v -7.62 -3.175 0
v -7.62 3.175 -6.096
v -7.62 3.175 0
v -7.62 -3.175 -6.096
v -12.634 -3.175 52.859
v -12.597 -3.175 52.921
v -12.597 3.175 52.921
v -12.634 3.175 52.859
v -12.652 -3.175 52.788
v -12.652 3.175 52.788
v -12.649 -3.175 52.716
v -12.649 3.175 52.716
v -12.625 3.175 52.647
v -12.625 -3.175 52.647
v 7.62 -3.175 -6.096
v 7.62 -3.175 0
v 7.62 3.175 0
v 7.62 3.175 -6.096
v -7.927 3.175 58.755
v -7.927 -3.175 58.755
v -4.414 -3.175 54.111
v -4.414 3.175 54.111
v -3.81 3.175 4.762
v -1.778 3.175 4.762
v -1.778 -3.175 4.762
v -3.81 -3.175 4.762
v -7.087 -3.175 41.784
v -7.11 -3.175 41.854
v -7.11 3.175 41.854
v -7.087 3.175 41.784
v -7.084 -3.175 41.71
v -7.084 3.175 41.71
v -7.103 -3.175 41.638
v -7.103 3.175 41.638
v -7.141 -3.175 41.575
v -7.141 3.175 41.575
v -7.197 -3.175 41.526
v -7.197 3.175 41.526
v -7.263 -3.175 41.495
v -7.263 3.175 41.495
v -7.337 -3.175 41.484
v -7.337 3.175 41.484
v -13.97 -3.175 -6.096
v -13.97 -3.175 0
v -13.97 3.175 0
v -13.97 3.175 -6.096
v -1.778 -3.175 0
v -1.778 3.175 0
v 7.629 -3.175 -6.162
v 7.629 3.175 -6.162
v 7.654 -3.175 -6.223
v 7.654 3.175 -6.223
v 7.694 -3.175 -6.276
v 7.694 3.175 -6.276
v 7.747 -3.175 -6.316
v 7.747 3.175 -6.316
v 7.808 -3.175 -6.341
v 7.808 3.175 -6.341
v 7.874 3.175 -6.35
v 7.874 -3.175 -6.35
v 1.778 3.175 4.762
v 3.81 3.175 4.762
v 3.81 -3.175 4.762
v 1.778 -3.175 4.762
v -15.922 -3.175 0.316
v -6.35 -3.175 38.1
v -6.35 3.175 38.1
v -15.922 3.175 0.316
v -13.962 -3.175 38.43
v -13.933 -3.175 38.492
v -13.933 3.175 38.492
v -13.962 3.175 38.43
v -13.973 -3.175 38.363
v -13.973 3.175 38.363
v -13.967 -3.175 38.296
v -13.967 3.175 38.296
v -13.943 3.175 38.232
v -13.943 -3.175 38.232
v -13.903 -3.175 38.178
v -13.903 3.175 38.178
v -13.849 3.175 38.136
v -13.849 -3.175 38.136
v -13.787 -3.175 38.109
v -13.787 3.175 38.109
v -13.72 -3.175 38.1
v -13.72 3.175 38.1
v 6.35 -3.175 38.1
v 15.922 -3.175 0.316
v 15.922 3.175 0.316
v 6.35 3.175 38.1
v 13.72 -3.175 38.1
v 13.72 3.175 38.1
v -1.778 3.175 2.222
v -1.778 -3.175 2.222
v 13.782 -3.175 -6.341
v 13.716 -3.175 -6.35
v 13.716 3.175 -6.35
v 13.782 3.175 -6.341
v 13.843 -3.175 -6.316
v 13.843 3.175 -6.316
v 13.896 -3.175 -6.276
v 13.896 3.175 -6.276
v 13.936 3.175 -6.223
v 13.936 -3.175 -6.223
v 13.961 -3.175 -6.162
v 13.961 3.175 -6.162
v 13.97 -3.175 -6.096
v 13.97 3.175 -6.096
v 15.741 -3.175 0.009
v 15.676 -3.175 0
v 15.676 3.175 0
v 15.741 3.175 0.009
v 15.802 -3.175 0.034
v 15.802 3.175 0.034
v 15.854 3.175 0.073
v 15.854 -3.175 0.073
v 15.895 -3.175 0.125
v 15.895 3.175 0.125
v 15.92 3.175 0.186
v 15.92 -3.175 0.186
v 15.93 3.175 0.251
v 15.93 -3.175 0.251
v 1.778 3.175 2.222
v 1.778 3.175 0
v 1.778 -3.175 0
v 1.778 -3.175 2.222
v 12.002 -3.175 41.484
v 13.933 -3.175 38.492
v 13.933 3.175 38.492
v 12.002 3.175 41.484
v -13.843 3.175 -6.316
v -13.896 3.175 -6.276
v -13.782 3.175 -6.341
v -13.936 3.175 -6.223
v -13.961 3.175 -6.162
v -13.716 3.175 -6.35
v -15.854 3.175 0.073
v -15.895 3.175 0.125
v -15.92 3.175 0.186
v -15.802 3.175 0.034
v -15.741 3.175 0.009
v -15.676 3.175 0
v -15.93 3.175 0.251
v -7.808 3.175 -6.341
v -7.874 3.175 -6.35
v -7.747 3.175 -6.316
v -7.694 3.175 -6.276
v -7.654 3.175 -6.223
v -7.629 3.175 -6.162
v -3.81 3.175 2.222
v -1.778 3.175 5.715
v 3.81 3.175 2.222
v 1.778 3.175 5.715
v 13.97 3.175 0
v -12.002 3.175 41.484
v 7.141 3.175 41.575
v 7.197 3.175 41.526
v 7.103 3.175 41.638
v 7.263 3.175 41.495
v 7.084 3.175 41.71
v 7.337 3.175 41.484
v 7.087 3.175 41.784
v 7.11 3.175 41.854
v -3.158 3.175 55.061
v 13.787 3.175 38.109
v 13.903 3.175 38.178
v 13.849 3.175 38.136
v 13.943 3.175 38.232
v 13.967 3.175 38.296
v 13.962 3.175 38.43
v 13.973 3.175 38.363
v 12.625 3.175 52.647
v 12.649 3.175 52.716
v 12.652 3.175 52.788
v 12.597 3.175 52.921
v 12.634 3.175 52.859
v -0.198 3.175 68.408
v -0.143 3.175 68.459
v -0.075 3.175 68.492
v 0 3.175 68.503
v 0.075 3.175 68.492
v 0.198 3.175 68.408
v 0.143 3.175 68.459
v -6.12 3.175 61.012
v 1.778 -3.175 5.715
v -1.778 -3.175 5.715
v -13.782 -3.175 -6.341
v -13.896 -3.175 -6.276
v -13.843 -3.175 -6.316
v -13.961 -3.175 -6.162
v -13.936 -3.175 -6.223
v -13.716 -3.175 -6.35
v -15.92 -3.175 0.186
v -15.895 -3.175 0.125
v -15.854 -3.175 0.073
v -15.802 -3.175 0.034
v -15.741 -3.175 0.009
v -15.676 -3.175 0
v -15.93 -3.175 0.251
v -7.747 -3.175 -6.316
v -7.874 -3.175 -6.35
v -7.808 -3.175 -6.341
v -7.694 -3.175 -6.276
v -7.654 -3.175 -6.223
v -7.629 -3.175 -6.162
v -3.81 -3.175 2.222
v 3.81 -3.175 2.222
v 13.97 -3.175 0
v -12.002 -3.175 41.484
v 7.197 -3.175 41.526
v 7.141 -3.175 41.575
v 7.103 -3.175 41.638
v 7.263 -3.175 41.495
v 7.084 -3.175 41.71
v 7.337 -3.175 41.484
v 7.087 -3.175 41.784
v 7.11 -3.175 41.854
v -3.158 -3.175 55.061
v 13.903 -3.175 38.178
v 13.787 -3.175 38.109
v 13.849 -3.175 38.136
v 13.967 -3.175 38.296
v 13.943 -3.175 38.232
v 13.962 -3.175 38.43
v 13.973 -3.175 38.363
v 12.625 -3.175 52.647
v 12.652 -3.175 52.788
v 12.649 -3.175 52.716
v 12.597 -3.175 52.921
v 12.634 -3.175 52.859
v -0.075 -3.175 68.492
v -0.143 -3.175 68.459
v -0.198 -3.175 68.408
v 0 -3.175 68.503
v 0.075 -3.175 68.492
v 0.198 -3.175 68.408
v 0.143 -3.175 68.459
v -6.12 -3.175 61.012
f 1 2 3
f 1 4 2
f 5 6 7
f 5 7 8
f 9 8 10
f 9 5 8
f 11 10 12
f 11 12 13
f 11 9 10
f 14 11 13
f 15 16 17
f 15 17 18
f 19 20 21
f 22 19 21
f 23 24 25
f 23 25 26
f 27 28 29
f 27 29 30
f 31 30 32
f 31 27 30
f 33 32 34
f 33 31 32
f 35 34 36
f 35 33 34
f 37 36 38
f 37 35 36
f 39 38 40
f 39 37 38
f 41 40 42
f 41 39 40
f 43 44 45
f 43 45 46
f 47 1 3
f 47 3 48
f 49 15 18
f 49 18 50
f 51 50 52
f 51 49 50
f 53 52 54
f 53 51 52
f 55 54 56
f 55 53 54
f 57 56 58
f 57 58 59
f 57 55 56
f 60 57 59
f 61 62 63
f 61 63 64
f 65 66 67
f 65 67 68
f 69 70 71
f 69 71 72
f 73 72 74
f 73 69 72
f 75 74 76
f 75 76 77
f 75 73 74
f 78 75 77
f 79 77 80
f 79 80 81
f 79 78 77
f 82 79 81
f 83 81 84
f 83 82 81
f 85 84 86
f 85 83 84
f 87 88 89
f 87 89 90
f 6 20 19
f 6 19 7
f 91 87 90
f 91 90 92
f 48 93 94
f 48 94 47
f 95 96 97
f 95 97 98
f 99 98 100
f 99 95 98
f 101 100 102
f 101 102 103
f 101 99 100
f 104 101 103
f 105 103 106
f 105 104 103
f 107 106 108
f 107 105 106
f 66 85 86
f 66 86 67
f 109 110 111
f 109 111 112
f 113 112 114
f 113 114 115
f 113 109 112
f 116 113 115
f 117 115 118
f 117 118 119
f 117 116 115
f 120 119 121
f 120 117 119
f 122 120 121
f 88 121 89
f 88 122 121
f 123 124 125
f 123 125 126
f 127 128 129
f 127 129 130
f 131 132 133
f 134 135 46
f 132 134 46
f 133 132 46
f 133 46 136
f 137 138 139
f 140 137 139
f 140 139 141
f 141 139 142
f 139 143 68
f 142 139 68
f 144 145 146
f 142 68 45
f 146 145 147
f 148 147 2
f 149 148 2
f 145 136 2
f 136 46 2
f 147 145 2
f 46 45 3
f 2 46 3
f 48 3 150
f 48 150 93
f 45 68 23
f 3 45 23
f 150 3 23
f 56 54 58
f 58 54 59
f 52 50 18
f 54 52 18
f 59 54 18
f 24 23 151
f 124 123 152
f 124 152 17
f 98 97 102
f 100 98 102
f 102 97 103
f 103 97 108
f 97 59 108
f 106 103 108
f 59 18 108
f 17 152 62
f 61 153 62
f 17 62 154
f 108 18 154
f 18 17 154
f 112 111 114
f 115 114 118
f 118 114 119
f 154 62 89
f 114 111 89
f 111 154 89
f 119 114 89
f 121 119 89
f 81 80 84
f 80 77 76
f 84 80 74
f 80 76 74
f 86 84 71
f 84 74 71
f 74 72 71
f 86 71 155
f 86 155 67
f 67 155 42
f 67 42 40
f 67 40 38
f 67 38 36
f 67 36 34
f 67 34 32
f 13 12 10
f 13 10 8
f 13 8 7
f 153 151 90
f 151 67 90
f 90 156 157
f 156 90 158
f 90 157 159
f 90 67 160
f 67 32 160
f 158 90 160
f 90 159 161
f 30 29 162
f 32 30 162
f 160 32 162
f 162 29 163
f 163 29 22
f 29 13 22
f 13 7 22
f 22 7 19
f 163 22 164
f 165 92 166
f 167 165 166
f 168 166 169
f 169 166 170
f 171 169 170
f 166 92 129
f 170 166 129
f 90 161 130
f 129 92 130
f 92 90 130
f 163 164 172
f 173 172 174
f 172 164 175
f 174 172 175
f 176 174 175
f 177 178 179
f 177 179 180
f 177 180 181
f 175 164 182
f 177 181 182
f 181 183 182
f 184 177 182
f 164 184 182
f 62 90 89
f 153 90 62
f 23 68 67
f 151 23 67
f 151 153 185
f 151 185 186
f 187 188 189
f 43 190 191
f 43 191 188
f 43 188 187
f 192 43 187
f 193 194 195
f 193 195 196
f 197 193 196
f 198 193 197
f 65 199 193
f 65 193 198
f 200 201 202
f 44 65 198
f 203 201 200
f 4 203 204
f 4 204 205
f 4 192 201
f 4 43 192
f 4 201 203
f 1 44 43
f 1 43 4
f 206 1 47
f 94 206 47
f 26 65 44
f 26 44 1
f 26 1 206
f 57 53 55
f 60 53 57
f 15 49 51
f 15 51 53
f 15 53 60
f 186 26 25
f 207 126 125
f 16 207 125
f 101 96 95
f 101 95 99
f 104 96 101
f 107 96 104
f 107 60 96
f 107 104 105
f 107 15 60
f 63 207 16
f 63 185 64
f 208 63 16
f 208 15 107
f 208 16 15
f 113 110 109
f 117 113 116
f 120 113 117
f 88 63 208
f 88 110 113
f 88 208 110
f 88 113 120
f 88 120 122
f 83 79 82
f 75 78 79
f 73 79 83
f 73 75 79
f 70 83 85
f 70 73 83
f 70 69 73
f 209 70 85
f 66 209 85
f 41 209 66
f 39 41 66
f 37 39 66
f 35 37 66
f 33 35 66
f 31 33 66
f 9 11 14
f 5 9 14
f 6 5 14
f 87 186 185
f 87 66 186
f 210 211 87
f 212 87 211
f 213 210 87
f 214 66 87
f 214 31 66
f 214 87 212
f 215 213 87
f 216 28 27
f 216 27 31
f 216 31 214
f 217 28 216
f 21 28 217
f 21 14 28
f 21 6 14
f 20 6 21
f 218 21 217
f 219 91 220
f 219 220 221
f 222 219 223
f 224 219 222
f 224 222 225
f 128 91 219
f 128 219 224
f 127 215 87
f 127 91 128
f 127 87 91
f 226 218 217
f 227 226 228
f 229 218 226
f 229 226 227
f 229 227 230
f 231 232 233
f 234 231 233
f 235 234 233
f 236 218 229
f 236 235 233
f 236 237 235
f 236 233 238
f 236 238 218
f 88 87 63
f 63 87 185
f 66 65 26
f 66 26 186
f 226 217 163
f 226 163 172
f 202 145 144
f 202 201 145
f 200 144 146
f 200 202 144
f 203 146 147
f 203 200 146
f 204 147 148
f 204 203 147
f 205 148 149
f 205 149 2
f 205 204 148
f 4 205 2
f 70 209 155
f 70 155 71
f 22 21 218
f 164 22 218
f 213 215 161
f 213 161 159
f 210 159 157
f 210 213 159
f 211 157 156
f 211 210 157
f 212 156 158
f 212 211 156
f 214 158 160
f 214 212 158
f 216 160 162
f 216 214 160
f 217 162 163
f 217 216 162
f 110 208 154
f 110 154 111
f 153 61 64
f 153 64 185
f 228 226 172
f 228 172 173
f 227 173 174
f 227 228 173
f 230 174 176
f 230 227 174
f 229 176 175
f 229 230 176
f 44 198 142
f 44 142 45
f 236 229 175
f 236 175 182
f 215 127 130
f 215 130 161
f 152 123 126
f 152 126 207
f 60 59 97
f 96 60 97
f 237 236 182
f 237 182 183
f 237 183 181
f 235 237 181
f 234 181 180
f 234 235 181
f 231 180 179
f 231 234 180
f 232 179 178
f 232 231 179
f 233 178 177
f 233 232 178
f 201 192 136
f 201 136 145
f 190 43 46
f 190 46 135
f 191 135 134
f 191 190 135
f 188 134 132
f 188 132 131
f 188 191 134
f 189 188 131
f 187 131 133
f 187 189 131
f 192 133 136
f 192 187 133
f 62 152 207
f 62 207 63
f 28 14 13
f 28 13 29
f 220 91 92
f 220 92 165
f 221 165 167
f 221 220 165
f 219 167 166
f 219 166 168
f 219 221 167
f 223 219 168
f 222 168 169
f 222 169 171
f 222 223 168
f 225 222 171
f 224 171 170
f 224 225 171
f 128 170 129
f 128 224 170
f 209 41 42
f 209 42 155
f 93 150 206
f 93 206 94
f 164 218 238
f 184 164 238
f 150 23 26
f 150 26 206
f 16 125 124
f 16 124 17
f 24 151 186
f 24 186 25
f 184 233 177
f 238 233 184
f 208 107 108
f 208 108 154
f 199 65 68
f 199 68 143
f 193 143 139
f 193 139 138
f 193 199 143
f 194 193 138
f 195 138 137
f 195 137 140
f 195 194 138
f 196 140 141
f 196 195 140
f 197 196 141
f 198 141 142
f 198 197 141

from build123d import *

# Parameters (mm, degrees)
F1_DEPTH      = 3.175
F1_DEPTH_BACK = 3.175
F3_DEPTH      = 25.4
F3_DEPTH_BACK = 25.4
F5_DEPTH      = 25.4
F5_DEPTH_BACK = 25.4


with BuildPart() as f1:
    # F0 (on Front) → F1 (new body, two sides)
    with BuildSketch(Plane.XZ) as f1_sk:
        with BuildLine():
            Line((-7.62, 0), (0, 0))
            Line((0, 0), (0, 38.1))
            Line((0, 38.1), (-6.35, 38.1))
            Line((-6.35, 38.1), (-15.9218513609, 0.3163762068))
            ThreePointArc((-15.9218513609, 0.3163762068), (-15.8760784336, 0.0979992893), (-15.6756294918, 0))
            Line((-15.6756294918, 0), (-13.97, 0))
            Line((-13.97, 0), (-13.97, -6.096))
            ThreePointArc((-13.97, -6.096), (-13.8956051224, -6.2756051224), (-13.716, -6.35))
            Line((-13.716, -6.35), (-7.874, -6.35))
            ThreePointArc((-7.874, -6.35), (-7.6943948776, -6.2756051224), (-7.62, -6.096))
            Line((-7.62, -6.096), (-7.62, 0))
        make_face()
        with BuildLine():
            Line((0, 38.1), (0, 0))
            Line((0, 0), (7.62, 0))
            Line((7.62, 0), (7.62, -6.096))
            ThreePointArc((7.62, -6.096), (7.6943948776, -6.2756051224), (7.874, -6.35))
            Line((7.874, -6.35), (13.716, -6.35))
            ThreePointArc((13.716, -6.35), (13.8956051224, -6.2756051224), (13.97, -6.096))
            Line((13.97, -6.096), (13.97, 0))
            Line((13.97, 0), (15.6756294918, 0))
            ThreePointArc((15.6756294918, 0), (15.8760784336, 0.0979992893), (15.9218513609, 0.3163762068))
            Line((15.9218513609, 0.3163762068), (6.35, 38.1))
            Line((6.35, 38.1), (0, 38.1))
        make_face()
        with BuildLine():
            Line((-6.35, 38.1), (0, 38.1))
            Line((0, 38.1), (6.35, 38.1))
            Line((6.35, 38.1), (12.0015, 38.1))
            Line((12.0015, 38.1), (12.0015, 41.4839549129))
            Line((12.0015, 41.4839549129), (7.3365180277, 41.4839549129))
            ThreePointArc((7.3365180277, 41.4839549129), (7.1198722569, 41.6053630202), (7.1103332026, 41.8535249129))
            Line((7.1103332026, 41.8535249129), (12.6253100407, 52.6470186525))
            ThreePointArc((12.6253100407, 52.6470186525), (12.6518210481, 52.7882949989), (12.5974039021, 52.9213386525))
            Line((12.5974039021, 52.9213386525), (0.1982786864, 68.4078410832))
            ThreePointArc((0.1982786864, 68.4078410832), (0, 68.5030910832), (-0.1982786864, 68.4078410832))
            Line((-0.1982786864, 68.4078410832), (-12.5974039021, 52.9213386525))
            ThreePointArc((-12.5974039021, 52.9213386525), (-12.6518210481, 52.7882949989), (-12.6253100407, 52.6470186525))
            Line((-12.6253100407, 52.6470186525), (-7.1103332026, 41.8535249129))
            ThreePointArc((-7.1103332026, 41.8535249129), (-7.1198722569, 41.6053630202), (-7.3365180277, 41.4839549129))
            Line((-7.3365180277, 41.4839549129), (-12.0015, 41.4839549129))
            Line((-12.0015, 41.4839549129), (-12.0015, 38.1))
            Line((-12.0015, 38.1), (-6.35, 38.1))
        make_face()
        with BuildLine():
            Line((-13.7196155367, 38.1), (-12.0015, 38.1))
            Line((-12.0015, 38.1), (-12.0015, 41.4839549129))
            Line((-12.0015, 41.4839549129), (-13.9330163108, 38.4917538008))
            ThreePointArc((-13.9330163108, 38.4917538008), (-13.9426687427, 38.2324958136), (-13.7196155367, 38.1))
        make_face()
        with BuildLine():
            Line((12.0015, 41.4839549129), (12.0015, 38.1))
            Line((12.0015, 38.1), (13.7196155367, 38.1))
            ThreePointArc((13.7196155367, 38.1), (13.9426687427, 38.2324958136), (13.9330163108, 38.4917538008))
            Line((13.9330163108, 38.4917538008), (12.0015, 41.4839549129))
        make_face()
    extrude(amount=F1_DEPTH)
    extrude(f1_sk.sketch, amount=-F1_DEPTH_BACK)

    # F2 (on Front) → F3 (cut, two sides)
    with BuildSketch(Plane.XZ) as f3_sk:
        Polygon((-3.1575310771, 55.0611501542), (-7.7323545702, 64.2502829432), (-9.8524354398, 61.3006092608), (-4.4139670208, 54.1107691824), align=None)
    extrude(amount=-F3_DEPTH, mode=Mode.SUBTRACT)
    extrude(f3_sk.sketch, amount=F3_DEPTH_BACK, mode=Mode.SUBTRACT)

    # F4 (on Front) → F5 (cut, two sides)
    with BuildSketch(Plane.XZ) as f5_sk:
        Polygon((1.778, 5.715), (-1.778, 5.715), (-1.778, 4.7625), (-3.81, 4.7625), (-3.81, 2.2225), (-1.778, 2.2225), (-1.778, 0), (1.778, 0), (1.778, 2.2225), (3.81, 2.2225), (3.81, 4.7625), (1.778, 4.7625), align=None)
    extrude(amount=F5_DEPTH, mode=Mode.SUBTRACT)
    extrude(f5_sk.sketch, amount=-F5_DEPTH_BACK, mode=Mode.SUBTRACT)


solid = f1.part
